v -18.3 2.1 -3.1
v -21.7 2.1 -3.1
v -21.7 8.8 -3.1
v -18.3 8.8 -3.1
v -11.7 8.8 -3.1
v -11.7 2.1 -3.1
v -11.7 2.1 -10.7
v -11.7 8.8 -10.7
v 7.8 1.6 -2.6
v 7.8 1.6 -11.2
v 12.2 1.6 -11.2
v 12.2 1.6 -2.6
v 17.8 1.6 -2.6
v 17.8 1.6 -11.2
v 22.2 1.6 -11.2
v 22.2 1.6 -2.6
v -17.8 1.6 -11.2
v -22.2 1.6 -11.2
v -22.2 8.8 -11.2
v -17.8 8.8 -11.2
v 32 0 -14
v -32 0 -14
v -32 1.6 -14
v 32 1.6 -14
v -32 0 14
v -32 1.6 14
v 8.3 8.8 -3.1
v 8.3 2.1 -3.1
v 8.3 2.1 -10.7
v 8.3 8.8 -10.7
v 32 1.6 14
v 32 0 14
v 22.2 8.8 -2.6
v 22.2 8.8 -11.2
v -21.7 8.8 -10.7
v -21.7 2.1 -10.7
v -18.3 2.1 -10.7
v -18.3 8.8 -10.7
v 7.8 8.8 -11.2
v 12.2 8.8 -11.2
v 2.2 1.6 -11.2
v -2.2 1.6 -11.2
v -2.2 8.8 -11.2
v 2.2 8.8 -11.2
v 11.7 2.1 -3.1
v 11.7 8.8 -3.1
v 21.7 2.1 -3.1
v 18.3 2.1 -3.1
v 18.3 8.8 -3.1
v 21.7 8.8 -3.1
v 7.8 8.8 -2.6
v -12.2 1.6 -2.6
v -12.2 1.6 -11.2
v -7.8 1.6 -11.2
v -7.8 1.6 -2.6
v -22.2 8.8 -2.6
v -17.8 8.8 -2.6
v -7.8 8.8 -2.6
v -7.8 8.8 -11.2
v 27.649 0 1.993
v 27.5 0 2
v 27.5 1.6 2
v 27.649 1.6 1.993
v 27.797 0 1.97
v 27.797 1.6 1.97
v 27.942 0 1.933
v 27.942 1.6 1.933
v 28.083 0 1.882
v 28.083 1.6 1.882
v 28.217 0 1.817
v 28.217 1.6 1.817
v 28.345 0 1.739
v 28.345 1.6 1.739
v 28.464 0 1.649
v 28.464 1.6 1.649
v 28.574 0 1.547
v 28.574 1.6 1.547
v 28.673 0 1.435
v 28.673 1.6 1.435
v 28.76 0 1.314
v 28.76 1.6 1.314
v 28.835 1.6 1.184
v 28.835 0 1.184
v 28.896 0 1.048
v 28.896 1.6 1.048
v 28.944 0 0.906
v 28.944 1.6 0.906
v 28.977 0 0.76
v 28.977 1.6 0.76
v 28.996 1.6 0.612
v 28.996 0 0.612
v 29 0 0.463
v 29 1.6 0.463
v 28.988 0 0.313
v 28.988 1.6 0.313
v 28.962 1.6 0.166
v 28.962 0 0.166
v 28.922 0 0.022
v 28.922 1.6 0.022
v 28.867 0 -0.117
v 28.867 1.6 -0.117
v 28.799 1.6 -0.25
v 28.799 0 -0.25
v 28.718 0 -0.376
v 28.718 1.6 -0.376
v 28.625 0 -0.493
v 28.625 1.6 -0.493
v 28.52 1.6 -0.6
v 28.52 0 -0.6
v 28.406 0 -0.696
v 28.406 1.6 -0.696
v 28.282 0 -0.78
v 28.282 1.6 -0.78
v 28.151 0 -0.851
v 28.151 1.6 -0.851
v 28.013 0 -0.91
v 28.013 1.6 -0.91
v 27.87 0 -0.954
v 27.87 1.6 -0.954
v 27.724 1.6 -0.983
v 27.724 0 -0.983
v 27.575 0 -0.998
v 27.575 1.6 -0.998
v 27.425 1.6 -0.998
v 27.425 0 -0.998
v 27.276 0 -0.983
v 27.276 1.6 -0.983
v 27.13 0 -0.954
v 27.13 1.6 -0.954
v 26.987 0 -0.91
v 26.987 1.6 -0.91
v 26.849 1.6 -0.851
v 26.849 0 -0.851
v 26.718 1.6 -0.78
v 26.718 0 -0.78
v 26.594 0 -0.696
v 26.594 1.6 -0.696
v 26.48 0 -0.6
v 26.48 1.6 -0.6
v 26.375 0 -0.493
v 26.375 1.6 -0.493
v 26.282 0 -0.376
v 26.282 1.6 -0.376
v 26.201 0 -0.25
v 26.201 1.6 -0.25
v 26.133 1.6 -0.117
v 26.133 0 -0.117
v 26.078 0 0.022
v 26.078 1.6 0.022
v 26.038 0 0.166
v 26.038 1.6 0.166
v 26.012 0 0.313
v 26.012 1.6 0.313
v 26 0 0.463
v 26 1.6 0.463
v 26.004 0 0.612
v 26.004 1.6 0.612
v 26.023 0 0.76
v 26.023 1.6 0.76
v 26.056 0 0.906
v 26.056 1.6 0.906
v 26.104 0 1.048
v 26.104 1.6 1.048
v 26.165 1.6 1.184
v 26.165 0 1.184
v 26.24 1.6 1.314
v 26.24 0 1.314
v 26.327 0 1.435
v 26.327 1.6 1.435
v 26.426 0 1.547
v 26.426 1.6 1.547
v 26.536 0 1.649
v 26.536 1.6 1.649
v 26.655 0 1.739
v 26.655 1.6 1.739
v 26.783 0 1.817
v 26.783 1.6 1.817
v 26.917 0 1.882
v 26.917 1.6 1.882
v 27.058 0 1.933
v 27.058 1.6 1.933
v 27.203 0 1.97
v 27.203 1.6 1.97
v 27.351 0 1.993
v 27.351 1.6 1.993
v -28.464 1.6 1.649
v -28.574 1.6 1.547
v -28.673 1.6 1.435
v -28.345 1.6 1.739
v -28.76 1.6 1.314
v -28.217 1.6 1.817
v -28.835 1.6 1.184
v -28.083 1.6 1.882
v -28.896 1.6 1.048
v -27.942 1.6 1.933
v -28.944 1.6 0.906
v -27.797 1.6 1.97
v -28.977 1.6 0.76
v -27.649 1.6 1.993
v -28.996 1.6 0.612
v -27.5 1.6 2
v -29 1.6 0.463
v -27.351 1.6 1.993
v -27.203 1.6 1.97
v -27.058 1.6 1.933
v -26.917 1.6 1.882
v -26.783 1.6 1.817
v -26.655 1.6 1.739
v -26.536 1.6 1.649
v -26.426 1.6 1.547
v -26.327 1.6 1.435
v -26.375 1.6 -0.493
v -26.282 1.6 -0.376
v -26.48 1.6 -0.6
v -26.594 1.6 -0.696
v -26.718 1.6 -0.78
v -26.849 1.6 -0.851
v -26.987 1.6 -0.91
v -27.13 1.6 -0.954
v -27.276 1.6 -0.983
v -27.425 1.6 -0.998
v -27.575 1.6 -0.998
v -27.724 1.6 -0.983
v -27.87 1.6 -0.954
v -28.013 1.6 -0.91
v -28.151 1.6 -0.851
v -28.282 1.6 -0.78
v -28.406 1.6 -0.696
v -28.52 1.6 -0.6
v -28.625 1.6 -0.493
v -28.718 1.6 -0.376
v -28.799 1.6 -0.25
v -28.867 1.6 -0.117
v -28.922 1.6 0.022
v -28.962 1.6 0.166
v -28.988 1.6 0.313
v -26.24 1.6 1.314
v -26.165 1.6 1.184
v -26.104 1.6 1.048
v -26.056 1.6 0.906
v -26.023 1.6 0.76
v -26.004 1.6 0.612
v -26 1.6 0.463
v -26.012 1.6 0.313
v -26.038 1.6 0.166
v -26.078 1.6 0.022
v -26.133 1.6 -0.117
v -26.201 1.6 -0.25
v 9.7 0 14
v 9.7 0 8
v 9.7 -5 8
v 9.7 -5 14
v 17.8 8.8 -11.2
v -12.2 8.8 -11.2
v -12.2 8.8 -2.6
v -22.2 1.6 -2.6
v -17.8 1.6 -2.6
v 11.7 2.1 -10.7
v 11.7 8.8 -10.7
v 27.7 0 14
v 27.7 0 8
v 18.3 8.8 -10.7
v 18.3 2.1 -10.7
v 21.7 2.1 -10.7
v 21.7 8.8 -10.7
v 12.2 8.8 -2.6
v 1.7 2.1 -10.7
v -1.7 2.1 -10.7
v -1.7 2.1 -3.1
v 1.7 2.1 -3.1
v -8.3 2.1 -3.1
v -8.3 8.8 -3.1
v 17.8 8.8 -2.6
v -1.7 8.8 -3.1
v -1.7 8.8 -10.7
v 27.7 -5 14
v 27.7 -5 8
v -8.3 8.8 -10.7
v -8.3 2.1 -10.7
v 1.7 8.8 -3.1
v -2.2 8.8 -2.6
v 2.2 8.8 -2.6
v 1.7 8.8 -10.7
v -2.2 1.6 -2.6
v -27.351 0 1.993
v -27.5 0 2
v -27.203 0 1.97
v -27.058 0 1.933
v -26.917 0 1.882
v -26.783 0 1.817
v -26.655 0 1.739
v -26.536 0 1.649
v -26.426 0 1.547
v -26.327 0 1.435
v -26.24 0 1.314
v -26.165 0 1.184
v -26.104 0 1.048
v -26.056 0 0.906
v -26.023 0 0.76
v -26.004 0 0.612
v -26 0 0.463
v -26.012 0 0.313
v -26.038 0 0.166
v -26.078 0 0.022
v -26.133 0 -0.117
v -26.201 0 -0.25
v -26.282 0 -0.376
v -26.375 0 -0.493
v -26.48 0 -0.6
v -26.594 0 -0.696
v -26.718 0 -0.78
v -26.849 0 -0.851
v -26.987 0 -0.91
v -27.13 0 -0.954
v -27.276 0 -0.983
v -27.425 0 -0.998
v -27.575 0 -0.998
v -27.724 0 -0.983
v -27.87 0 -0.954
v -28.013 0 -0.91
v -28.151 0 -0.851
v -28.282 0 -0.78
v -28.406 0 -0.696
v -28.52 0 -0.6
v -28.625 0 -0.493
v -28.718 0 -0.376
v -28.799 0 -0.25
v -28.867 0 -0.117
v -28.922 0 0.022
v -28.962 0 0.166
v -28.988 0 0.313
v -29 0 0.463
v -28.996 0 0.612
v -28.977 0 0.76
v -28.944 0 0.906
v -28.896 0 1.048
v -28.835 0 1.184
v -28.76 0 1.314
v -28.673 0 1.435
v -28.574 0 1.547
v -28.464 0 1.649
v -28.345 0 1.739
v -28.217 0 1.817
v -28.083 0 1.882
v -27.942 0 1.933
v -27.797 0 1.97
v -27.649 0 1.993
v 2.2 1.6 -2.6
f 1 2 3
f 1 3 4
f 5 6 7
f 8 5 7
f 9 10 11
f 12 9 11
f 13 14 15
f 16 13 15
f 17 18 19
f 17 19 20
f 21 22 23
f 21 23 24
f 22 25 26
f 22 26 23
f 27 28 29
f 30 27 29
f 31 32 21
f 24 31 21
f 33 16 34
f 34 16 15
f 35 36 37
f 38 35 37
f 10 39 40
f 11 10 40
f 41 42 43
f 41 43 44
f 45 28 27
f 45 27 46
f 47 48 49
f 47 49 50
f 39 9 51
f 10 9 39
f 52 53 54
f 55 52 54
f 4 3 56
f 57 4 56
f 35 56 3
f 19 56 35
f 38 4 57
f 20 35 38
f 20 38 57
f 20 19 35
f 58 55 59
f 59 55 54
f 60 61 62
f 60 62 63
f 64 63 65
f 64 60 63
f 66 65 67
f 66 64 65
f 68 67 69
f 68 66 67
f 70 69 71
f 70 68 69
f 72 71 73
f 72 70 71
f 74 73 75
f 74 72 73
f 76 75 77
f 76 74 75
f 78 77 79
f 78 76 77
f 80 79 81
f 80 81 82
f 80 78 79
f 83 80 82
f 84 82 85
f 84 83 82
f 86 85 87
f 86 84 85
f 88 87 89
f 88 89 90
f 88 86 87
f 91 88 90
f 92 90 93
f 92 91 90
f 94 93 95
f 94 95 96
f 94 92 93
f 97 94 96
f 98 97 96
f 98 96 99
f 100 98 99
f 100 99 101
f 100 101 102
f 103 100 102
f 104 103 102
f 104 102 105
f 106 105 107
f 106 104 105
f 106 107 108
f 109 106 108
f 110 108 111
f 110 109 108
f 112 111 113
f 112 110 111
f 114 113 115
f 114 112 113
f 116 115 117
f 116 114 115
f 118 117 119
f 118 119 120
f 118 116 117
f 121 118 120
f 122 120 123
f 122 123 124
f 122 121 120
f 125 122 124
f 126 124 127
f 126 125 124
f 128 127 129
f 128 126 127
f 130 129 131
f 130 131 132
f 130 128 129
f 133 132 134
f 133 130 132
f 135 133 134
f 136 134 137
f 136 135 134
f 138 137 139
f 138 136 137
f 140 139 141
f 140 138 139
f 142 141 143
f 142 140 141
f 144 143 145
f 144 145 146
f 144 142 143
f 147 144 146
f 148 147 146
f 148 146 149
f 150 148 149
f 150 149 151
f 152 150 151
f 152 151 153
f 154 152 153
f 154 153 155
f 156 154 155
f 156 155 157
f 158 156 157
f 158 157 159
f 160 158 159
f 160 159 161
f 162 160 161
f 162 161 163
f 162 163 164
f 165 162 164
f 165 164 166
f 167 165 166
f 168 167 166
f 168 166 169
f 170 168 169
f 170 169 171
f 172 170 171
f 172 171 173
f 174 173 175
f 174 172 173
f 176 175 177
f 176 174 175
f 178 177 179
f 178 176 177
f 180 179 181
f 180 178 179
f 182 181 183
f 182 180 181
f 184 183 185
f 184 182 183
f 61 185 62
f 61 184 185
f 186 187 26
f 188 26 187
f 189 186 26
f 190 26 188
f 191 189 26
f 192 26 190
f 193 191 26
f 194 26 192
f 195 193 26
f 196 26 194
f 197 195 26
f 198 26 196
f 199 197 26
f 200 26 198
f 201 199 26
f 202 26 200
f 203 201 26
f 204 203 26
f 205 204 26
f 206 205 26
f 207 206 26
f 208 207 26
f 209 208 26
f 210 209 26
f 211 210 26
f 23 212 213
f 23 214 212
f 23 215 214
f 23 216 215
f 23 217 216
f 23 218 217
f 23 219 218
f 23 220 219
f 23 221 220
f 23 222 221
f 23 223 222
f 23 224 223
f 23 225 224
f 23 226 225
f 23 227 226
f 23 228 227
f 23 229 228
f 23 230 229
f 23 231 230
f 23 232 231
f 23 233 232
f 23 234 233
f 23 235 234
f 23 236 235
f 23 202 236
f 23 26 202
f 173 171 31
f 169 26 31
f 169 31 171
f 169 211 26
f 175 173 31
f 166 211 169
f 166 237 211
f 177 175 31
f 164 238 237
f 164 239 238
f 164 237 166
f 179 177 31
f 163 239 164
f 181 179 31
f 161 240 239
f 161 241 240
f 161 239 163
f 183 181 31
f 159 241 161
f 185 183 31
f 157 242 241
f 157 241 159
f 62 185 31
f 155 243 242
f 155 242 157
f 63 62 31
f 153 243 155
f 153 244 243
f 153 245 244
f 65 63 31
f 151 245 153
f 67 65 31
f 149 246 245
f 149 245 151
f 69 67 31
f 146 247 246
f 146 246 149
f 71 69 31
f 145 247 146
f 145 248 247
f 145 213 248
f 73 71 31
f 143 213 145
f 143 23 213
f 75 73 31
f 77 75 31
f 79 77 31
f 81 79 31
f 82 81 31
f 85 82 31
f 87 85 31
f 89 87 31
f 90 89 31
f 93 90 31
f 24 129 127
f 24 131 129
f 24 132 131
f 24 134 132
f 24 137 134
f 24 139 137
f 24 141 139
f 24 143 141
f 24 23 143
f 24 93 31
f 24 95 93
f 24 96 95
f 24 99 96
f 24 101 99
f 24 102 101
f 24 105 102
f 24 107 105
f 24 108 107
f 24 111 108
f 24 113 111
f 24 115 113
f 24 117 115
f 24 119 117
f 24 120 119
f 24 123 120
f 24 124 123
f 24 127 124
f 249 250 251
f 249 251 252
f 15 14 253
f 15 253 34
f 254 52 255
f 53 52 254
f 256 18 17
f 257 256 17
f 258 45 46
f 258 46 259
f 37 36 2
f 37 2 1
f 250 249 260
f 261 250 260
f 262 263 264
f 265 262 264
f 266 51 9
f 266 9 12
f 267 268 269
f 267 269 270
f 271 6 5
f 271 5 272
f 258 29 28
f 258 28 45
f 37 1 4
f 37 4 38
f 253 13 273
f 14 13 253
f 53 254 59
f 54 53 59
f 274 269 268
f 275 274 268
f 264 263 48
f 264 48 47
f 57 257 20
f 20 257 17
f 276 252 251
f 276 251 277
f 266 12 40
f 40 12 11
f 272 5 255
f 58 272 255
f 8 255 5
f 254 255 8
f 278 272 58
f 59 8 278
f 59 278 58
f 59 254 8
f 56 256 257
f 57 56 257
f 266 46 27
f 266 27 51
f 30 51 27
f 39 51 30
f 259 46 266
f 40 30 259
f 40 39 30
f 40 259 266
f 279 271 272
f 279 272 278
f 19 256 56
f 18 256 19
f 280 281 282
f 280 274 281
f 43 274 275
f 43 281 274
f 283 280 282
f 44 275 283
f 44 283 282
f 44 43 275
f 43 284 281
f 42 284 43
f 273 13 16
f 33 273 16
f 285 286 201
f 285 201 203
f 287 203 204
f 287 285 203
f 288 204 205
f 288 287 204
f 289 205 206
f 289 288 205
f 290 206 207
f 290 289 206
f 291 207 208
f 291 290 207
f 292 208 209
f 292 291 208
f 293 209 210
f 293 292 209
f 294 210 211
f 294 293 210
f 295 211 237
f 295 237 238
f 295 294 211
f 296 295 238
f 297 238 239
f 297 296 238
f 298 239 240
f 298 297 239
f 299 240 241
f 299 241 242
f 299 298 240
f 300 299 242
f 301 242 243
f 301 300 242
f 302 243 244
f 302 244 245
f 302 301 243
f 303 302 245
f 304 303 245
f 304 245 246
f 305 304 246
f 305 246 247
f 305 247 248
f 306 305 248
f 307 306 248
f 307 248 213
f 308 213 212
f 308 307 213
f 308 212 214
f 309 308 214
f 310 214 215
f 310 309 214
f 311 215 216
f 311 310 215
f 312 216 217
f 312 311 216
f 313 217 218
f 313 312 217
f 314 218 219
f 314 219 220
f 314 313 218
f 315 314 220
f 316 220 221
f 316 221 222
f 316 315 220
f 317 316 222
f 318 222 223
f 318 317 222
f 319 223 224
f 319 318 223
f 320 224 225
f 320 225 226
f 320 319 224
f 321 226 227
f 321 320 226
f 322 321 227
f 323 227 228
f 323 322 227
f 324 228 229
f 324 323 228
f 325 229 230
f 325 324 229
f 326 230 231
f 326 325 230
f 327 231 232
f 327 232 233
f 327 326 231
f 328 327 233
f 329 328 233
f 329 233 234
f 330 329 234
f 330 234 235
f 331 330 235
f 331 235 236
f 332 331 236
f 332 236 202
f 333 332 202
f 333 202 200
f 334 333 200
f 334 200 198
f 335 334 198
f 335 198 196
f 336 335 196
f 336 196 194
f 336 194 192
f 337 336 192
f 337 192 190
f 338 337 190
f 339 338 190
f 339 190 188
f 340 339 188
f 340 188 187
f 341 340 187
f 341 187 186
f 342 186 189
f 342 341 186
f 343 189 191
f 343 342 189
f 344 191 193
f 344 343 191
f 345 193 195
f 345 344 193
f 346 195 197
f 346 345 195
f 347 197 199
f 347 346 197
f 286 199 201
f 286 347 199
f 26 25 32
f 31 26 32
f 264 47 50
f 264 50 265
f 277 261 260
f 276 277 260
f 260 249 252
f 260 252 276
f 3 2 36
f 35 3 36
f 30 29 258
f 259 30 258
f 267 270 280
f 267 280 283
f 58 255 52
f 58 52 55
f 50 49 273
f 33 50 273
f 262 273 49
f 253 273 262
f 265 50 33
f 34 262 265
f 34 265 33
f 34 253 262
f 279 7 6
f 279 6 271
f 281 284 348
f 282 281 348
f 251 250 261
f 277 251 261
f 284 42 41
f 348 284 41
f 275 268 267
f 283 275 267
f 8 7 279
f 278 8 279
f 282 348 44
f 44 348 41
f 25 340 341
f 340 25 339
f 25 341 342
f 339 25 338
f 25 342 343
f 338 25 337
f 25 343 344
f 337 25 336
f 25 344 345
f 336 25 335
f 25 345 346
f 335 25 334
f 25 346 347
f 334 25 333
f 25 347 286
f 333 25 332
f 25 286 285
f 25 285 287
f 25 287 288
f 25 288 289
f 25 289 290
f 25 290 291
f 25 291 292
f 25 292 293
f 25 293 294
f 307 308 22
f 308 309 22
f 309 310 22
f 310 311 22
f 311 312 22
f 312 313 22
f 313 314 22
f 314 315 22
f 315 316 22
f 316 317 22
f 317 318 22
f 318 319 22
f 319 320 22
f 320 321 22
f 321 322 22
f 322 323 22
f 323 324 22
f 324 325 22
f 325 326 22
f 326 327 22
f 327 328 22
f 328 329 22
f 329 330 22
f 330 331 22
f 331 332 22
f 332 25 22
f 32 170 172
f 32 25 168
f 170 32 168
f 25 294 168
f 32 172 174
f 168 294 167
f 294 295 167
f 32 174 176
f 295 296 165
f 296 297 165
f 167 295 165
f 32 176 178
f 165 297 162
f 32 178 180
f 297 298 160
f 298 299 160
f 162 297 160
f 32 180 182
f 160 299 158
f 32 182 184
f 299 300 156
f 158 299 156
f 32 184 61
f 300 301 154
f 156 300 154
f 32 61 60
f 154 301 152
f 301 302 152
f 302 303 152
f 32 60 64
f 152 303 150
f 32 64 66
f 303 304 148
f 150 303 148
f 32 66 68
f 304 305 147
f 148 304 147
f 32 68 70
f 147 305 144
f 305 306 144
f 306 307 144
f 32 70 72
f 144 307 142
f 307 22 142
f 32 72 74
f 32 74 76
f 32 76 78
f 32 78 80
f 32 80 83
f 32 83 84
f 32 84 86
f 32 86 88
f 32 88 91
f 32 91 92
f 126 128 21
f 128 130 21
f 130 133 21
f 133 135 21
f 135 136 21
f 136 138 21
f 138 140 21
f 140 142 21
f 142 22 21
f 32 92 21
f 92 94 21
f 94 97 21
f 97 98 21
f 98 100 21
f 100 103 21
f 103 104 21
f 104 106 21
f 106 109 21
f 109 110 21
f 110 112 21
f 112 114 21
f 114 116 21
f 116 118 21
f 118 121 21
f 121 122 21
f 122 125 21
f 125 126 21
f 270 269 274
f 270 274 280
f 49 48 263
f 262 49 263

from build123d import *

# Parameters (mm, degrees)
SKETCH1_W             = 64
SKETCH1_H             = 28
SKETCH1_R             = 1.5
BOSS_EXTRUDE1_DEPTH   = 1.6
SKETCH2_W             = 4.4
SKETCH2_H             = 8.6
BOSS_EXTRUDE2_DEPTH   = 7.2
BOSS_EXTRUDE2_2_DEPTH = 7.2
BOSS_EXTRUDE2_3_DEPTH = 7.2
BOSS_EXTRUDE2_4_DEPTH = 7.2
BOSS_EXTRUDE2_5_DEPTH = 7.2
SHELL1_T              = -0.5
SHELL2_T              = -0.5
SHELL3_T              = -0.5
SHELL4_T              = -0.5
SHELL5_T              = -0.5
SKETCH3_W             = 18
SKETCH3_H             = 6
BOSS_EXTRUDE3_DEPTH   = 5


with BuildPart() as part:
    # Sketch1 → Boss-Extrude1 (new body)
    with BuildSketch(Plane(origin=(0, 0, 0), x_dir=(1, 0, 0), z_dir=(0, 1, 0))):
        Rectangle(SKETCH1_W, SKETCH1_H)
        with Locations(Location((27.5, -0.5, 0), (0, 0, 270))):
            Circle(SKETCH1_R, mode=Mode.SUBTRACT)
        with Locations(Location((-27.5, -0.5, 0), (0, 0, 270))):
            Circle(SKETCH1_R, mode=Mode.SUBTRACT)
    extrude(amount=BOSS_EXTRUDE1_DEPTH)


with BuildPart() as body_2:
    # Sketch2 → Boss-Extrude2 (new body)
    with BuildSketch(Plane(origin=(0, 1.6, 0), x_dir=(1, 0, 0), z_dir=(0, 1, 0))):
        with Locations((0, 6.9)):
            Rectangle(SKETCH2_W, SKETCH2_H)
    extrude(amount=BOSS_EXTRUDE2_DEPTH)

    # Shell3
    shell3_openings = [body_2.faces().sort_by_distance(p)[0] for p in [
        (0, 8.8, -6.9),
    ]]
    offset(amount=SHELL3_T, openings=shell3_openings, kind=Kind.INTERSECTION)


with BuildPart() as body_3:
    # Sketch2 → Boss-Extrude2 2 (new body)
    with BuildSketch(Plane(origin=(0, 1.6, 0), x_dir=(1, 0, 0), z_dir=(0, 1, 0))):
        with Locations((10, 6.9)):
            Rectangle(SKETCH2_W, SKETCH2_H)
    extrude(amount=BOSS_EXTRUDE2_2_DEPTH)

    # Shell4
    shell4_openings = [body_3.faces().sort_by_distance(p)[0] for p in [
        (10, 8.8, -6.9),
    ]]
    offset(amount=SHELL4_T, openings=shell4_openings, kind=Kind.INTERSECTION)


with BuildPart() as body_4:
    # Sketch2 → Boss-Extrude2 3 (new body)
    with BuildSketch(Plane(origin=(0, 1.6, 0), x_dir=(1, 0, 0), z_dir=(0, 1, 0))):
        with Locations((20, 6.9)):
            Rectangle(SKETCH2_W, SKETCH2_H)
    extrude(amount=BOSS_EXTRUDE2_3_DEPTH)

    # Shell5
    shell5_openings = [body_4.faces().sort_by_distance(p)[0] for p in [
        (20, 8.8, -6.9),
    ]]
    offset(amount=SHELL5_T, openings=shell5_openings, kind=Kind.INTERSECTION)


with BuildPart() as body_5:
    # Sketch2 → Boss-Extrude2 4 (new body)
    with BuildSketch(Plane(origin=(0, 1.6, 0), x_dir=(1, 0, 0), z_dir=(0, 1, 0))):
        with Locations((-10, 6.9)):
            Rectangle(SKETCH2_W, SKETCH2_H)
    extrude(amount=BOSS_EXTRUDE2_4_DEPTH)

    # Shell2
    shell2_openings = [body_5.faces().sort_by_distance(p)[0] for p in [
        (-10, 8.8, -6.9),
    ]]
    offset(amount=SHELL2_T, openings=shell2_openings, kind=Kind.INTERSECTION)


with BuildPart() as body_6:
    # Sketch2 → Boss-Extrude2 5 (new body)
    with BuildSketch(Plane(origin=(0, 1.6, 0), x_dir=(1, 0, 0), z_dir=(0, 1, 0))):
        with Locations((-20, 6.9)):
            Rectangle(SKETCH2_W, SKETCH2_H)
    extrude(amount=BOSS_EXTRUDE2_5_DEPTH)

    # Shell1
    shell1_openings = [body_6.faces().sort_by_distance(p)[0] for p in [
        (-20, 8.8, -6.9),
    ]]
    offset(amount=SHELL1_T, openings=shell1_openings, kind=Kind.INTERSECTION)


with BuildPart() as body_7:
    # Sketch3 → Boss-Extrude3 (new body)
    with BuildSketch(Plane.XZ):
        with Locations((18.7, 11)):
            Rectangle(SKETCH3_W, SKETCH3_H)
    extrude(amount=BOSS_EXTRUDE3_DEPTH)


solid = Compound([part.part, body_2.part, body_3.part, body_4.part, body_5.part, body_6.part, body_7.part])
